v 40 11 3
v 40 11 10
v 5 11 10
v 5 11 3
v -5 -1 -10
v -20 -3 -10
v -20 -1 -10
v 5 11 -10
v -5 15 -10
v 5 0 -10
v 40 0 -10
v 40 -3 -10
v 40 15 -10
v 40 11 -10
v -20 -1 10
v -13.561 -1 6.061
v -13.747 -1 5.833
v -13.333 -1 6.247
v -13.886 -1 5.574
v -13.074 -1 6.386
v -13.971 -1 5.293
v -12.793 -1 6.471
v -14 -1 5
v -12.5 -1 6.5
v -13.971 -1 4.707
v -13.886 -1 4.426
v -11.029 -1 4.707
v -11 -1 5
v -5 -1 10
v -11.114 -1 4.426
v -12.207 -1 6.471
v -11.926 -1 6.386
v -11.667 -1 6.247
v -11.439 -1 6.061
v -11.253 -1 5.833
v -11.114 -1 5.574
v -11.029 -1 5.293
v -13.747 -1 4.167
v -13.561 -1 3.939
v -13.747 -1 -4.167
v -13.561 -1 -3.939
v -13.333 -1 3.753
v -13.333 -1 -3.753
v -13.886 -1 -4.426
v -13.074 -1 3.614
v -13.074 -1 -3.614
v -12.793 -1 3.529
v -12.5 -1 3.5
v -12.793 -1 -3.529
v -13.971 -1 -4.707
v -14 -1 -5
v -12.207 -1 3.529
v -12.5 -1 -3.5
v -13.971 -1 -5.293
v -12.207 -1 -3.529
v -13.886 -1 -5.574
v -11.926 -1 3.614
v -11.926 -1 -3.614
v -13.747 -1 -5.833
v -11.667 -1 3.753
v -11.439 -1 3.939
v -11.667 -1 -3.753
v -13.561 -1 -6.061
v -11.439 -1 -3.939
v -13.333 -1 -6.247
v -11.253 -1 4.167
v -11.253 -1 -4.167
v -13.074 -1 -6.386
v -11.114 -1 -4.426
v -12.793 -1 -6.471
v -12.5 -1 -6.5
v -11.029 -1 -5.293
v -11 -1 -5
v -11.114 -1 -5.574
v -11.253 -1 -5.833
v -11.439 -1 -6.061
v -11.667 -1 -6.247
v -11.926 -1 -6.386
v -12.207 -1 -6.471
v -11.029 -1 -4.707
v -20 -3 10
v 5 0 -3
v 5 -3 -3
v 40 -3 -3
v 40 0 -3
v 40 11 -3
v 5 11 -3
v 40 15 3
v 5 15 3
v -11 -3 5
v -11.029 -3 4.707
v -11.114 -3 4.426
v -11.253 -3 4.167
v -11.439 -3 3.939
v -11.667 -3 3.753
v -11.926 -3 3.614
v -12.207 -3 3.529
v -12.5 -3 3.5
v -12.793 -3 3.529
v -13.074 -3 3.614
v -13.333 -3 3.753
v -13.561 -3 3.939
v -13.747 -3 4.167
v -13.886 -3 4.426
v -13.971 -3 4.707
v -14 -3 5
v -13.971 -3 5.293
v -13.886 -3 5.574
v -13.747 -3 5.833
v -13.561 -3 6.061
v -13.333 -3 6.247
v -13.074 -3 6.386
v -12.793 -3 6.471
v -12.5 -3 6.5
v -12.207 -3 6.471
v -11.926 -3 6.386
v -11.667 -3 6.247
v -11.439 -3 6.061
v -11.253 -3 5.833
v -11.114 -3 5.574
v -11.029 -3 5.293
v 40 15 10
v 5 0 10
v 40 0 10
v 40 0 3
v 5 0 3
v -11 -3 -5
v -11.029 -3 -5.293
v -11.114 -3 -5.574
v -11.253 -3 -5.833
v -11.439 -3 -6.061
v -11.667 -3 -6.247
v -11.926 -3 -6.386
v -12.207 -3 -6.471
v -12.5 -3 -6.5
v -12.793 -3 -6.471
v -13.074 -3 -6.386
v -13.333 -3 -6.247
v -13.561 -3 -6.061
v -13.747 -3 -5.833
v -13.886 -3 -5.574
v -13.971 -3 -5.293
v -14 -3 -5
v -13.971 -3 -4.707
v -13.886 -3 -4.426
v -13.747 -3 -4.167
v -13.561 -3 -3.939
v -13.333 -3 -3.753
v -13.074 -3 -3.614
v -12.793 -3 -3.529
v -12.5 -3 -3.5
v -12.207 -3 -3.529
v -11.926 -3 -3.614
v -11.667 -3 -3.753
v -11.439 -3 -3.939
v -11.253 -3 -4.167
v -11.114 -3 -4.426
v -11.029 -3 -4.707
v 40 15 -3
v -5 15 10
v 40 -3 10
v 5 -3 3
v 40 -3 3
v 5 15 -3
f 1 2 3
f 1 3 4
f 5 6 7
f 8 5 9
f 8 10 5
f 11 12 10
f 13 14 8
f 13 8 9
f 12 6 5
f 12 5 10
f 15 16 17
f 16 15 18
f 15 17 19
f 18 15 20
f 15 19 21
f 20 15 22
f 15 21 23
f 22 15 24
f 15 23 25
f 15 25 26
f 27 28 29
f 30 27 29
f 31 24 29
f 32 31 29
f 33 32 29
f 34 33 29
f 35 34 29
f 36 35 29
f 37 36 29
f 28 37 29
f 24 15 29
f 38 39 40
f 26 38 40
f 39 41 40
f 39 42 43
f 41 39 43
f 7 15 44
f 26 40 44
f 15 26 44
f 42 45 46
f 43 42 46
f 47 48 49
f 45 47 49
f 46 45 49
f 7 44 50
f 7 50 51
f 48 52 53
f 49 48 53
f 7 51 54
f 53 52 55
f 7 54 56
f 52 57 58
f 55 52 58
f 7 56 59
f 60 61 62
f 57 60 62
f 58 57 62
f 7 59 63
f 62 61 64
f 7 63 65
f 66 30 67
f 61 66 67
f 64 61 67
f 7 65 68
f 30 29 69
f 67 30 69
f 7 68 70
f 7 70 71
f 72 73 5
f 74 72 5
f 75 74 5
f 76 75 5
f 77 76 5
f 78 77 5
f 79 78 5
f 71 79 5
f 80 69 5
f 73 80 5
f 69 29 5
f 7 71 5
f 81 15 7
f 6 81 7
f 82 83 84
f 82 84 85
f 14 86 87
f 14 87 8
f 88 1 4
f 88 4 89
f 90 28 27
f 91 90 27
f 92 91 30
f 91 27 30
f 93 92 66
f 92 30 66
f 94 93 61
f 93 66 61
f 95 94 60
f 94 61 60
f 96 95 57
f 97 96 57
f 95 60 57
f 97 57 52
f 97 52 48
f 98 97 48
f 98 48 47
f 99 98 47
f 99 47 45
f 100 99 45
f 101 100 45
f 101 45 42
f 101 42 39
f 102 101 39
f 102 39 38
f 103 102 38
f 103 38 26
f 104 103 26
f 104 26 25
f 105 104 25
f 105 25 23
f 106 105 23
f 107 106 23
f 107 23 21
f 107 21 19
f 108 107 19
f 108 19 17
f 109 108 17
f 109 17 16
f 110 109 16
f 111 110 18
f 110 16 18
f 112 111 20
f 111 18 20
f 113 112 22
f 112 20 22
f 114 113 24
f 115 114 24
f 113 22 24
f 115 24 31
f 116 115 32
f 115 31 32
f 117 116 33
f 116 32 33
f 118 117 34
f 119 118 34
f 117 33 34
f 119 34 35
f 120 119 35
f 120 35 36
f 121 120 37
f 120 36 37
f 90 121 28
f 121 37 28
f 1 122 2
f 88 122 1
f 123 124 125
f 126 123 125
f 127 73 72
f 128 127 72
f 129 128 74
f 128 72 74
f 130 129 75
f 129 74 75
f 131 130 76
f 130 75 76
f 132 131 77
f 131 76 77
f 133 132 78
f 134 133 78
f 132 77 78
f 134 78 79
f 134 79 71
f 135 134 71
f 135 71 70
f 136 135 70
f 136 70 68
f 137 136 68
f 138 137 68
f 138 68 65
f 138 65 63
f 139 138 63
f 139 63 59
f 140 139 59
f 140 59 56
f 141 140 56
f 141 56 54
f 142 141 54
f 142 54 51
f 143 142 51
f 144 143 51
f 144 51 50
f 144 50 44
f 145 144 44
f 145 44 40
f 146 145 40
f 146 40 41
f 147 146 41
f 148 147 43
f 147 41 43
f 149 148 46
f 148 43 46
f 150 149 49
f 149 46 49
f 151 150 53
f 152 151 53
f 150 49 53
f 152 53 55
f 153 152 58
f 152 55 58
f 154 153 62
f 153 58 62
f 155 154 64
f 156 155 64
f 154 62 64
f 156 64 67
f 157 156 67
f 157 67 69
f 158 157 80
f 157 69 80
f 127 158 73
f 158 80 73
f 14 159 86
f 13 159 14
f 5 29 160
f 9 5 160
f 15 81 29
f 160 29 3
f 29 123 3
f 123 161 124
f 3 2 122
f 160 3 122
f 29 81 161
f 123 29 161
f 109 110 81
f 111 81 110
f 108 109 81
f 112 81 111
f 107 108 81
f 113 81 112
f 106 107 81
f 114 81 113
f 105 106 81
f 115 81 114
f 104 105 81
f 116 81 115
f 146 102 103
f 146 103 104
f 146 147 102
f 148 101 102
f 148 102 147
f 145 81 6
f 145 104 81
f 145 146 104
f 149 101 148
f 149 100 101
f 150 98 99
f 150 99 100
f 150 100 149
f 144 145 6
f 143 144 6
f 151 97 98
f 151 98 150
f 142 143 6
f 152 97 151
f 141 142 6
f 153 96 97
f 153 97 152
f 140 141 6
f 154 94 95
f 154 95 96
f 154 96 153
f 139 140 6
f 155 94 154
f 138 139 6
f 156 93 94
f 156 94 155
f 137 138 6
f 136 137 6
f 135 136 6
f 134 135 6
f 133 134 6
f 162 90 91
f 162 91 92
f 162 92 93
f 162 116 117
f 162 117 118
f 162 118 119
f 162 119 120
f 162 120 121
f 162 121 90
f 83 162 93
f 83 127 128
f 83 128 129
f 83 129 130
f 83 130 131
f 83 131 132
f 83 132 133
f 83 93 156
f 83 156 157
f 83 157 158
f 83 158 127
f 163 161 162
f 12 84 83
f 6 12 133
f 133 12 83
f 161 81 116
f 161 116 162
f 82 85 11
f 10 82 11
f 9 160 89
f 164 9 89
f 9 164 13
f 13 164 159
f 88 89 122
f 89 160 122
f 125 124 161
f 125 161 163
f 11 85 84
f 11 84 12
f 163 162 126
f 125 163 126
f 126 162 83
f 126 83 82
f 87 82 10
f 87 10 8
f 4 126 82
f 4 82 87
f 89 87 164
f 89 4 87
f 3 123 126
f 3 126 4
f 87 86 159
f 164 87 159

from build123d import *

# Parameters (mm, degrees)
BOSS_EXTRUDE1_DEPTH      = 10
BOSS_EXTRUDE1_DEPTH_BACK = 10
SKETCH1_W                = 10
SKETCH1_H                = 18
SKETCH2_W                = 20
SKETCH2_H                = 2
BOSS_EXTRUDE2_DEPTH      = 20
SKETCH3_W                = 7
SKETCH3_H                = 4
SKETCH3_H_2              = 3
BOSS_EXTRUDE3_DEPTH      = 40
SKETCH7_R                = 1.5
CUT_EXTRUDE2_DEPTH       = 10


with BuildPart() as part:
    # Sketch1 → Boss-Extrude1 (new, two sides: drawn at the far end of the back side and taken through both)
    with BuildSketch(Plane.XY.offset(-BOSS_EXTRUDE1_DEPTH_BACK)):
        with Locations((0, 6)):
            Rectangle(SKETCH1_W, SKETCH1_H)
    extrude(amount=BOSS_EXTRUDE1_DEPTH + BOSS_EXTRUDE1_DEPTH_BACK)

    # Sketch2 → Boss-Extrude2 (add)
    with BuildSketch(Plane(origin=(0, 0, 0), x_dir=(0, 0, -1), z_dir=(1, 0, 0))):
        with Locations((0, -2)):
            Rectangle(SKETCH2_W, SKETCH2_H)
    extrude(amount=-BOSS_EXTRUDE2_DEPTH)

    # Sketch3 → Boss-Extrude3 (add)
    with BuildSketch(Plane(origin=(0, 0, 0), x_dir=(0, 0, -1), z_dir=(1, 0, 0))):
        with Locations((-6.5, 13)):
            Rectangle(SKETCH3_W, SKETCH3_H)
        with Locations((-6.5, -1.5)):
            Rectangle(SKETCH3_W, SKETCH3_H_2)
        with Locations((6.5, -1.5)):
            Rectangle(SKETCH3_W, SKETCH3_H_2)
        with Locations((6.5, 13)):
            Rectangle(SKETCH3_W, SKETCH3_H)
    extrude(amount=BOSS_EXTRUDE3_DEPTH)

    # Sketch7 → Cut-Extrude2 (cut)
    with BuildSketch(Plane(origin=(0, 0, 0), x_dir=(1, 0, 0), z_dir=(0, 1, 0))):
        with Locations((-12.5, 5)):
            Circle(SKETCH7_R)
        with Locations((-12.5, -5)):
            Circle(SKETCH7_R)
    extrude(amount=-CUT_EXTRUDE2_DEPTH, mode=Mode.SUBTRACT)


solid = part.part
